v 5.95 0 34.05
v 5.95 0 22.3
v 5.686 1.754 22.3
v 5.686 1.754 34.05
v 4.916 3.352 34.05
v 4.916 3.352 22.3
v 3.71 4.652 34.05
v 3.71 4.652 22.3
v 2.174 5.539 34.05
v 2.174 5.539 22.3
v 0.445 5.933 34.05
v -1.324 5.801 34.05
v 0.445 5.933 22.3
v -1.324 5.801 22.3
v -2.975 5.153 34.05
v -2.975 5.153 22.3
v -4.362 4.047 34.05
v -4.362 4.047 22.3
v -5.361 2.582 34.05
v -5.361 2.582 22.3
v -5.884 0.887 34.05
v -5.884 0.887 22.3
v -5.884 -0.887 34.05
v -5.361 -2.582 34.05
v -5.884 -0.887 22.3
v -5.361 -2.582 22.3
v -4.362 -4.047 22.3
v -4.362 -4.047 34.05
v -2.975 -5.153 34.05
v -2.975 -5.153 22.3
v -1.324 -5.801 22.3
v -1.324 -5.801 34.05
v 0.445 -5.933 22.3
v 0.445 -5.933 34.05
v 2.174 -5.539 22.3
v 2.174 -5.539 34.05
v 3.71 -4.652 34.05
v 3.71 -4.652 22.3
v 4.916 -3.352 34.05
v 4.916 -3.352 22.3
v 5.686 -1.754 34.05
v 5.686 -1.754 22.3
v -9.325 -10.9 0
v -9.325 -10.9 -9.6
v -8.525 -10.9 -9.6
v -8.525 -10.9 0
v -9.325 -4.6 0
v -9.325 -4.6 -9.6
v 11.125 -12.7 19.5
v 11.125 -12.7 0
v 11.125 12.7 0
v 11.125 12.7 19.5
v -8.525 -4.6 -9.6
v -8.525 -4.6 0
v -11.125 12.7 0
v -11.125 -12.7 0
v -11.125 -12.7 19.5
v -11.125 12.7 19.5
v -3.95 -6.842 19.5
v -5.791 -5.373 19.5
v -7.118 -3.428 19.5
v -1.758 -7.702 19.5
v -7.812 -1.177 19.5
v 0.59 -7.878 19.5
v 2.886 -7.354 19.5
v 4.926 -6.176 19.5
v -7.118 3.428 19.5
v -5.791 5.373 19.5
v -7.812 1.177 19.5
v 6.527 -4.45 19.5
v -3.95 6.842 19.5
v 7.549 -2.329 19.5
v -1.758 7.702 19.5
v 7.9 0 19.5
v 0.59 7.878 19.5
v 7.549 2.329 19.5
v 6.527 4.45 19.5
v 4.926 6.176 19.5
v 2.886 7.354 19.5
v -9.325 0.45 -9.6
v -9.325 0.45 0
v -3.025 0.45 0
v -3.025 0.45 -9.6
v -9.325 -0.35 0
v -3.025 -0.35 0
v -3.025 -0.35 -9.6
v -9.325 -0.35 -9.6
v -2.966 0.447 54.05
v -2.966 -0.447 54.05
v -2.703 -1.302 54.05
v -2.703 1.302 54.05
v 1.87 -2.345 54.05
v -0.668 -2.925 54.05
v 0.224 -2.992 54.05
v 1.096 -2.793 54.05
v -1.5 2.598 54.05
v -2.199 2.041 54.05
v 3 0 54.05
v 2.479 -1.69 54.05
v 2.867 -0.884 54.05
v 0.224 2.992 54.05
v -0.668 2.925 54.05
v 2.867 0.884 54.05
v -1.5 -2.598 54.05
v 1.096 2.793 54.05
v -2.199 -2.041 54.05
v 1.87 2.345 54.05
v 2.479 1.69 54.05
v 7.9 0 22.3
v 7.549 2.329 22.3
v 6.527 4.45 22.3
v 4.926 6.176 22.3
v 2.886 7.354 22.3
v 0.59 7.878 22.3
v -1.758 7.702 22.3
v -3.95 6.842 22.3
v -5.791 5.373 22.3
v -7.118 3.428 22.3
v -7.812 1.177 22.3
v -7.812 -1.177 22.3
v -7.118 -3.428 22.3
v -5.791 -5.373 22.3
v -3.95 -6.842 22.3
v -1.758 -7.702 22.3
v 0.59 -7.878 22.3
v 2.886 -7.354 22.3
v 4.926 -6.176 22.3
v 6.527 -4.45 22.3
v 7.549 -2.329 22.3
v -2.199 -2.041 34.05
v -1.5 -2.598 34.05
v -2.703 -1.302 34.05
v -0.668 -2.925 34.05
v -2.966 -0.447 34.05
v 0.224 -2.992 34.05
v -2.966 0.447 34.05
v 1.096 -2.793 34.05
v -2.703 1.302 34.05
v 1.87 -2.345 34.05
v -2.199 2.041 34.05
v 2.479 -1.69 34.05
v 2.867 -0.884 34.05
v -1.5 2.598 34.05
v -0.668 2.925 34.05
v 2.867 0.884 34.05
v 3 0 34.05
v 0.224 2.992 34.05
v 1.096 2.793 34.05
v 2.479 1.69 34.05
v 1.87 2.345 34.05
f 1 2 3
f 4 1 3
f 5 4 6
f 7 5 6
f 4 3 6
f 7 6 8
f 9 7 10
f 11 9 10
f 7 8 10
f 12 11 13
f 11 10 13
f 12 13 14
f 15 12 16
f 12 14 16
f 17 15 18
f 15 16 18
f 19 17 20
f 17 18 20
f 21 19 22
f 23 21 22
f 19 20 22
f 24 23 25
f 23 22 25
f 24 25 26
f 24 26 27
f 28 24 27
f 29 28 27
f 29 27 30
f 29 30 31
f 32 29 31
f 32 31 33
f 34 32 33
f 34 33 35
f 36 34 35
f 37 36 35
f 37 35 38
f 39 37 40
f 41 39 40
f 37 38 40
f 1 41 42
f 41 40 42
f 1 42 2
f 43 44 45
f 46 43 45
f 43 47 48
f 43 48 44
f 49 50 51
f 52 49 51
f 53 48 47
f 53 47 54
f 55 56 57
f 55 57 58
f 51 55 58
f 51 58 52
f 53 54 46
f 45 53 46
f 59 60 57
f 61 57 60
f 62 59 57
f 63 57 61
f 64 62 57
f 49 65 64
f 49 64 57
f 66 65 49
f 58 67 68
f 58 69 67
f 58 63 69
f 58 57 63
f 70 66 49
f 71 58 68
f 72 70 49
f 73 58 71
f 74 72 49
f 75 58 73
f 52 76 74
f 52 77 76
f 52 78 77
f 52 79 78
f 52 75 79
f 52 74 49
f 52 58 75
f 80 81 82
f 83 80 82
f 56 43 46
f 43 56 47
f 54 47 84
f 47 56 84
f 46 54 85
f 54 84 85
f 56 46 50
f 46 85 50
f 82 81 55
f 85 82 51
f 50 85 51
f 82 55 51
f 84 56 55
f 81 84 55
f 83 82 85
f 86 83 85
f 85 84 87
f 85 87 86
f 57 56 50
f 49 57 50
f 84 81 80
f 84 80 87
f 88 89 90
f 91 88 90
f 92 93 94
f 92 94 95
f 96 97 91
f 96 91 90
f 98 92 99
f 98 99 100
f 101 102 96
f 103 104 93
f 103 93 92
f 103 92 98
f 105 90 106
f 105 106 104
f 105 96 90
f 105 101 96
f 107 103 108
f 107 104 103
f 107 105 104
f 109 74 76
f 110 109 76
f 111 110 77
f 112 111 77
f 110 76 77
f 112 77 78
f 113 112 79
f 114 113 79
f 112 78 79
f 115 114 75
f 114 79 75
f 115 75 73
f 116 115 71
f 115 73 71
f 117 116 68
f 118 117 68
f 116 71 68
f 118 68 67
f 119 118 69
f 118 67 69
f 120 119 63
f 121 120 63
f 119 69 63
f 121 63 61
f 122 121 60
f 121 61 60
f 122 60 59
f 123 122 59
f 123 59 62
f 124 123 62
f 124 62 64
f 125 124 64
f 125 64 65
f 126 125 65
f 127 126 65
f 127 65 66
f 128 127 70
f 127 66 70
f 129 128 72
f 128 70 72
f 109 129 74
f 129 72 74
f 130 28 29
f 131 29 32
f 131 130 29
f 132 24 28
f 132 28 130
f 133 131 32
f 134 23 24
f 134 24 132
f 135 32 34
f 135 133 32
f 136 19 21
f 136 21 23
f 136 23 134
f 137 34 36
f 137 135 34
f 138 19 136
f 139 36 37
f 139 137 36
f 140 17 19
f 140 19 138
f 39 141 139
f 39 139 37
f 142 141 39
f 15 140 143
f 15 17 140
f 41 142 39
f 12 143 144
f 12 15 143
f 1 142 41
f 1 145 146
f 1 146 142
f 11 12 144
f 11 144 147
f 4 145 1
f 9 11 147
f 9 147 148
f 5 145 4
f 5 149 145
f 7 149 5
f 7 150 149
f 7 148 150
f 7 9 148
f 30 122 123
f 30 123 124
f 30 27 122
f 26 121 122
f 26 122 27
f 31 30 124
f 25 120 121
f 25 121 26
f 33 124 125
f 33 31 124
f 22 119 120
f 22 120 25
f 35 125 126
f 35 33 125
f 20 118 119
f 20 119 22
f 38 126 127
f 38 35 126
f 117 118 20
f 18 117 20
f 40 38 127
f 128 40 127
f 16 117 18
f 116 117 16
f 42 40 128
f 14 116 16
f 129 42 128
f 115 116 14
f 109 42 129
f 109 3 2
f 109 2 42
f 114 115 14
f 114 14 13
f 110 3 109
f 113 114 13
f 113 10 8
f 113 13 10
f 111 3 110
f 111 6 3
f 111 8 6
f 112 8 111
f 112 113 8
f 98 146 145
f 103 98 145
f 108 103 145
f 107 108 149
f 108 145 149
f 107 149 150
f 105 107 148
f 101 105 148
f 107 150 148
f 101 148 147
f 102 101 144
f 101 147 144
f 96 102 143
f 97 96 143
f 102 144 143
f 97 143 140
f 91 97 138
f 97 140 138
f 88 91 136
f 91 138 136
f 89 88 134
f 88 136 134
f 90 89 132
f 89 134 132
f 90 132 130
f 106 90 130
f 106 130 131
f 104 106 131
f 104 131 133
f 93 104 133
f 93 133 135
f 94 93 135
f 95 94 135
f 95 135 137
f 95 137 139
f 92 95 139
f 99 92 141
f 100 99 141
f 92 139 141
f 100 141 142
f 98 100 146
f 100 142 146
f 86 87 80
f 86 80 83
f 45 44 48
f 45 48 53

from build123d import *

# Parameters (mm, degrees)
F0_W     = 22.25
F0_H     = 25.4
F1_DEPTH = 19.5
F2_R     = 7.9
F2_R_2   = 5.95
F3_DEPTH = 2.8
F4_R     = 5.95
F5_DEPTH = 11.75
F6_R     = 3
F7_DEPTH = 20
F8_W     = 0.8
F8_H     = 6.3
F8_W_2   = 6.3
F8_H_2   = 0.8
F9_DEPTH = 9.6


with BuildPart() as f1:
    # F0 (on Top) → F1 (new body)
    with BuildSketch(Plane.XY):
        Rectangle(F0_W, F0_H)
    extrude(amount=F1_DEPTH)

    # F2 (on face) → F3 (join)
    with BuildSketch(Plane.XY.offset(19.5)):
        Circle(F2_R)
        Circle(F2_R_2, mode=Mode.SUBTRACT)
        Circle(F2_R_2)
    extrude(amount=F3_DEPTH)

    # F4 (on face) → F5 (join)
    with BuildSketch(Plane.XY.offset(22.3)):
        Circle(F4_R)
    extrude(amount=F5_DEPTH)

    # F6 (on face) → F7 (join)
    with BuildSketch(Plane.XY.offset(34.05)):
        Circle(F6_R)
    extrude(amount=F7_DEPTH)

    # F8 (on face) → F9 (join)
    with BuildSketch(Plane(origin=(0, 0, 0), x_dir=(1, 0, 0), z_dir=(0, 0, -1))):
        with Locations((-8.925, 7.75)):
            Rectangle(F8_W, F8_H)
        with Locations((-6.175, -0.05)):
            Rectangle(F8_W_2, F8_H_2)
    extrude(amount=F9_DEPTH)


solid = f1.part
